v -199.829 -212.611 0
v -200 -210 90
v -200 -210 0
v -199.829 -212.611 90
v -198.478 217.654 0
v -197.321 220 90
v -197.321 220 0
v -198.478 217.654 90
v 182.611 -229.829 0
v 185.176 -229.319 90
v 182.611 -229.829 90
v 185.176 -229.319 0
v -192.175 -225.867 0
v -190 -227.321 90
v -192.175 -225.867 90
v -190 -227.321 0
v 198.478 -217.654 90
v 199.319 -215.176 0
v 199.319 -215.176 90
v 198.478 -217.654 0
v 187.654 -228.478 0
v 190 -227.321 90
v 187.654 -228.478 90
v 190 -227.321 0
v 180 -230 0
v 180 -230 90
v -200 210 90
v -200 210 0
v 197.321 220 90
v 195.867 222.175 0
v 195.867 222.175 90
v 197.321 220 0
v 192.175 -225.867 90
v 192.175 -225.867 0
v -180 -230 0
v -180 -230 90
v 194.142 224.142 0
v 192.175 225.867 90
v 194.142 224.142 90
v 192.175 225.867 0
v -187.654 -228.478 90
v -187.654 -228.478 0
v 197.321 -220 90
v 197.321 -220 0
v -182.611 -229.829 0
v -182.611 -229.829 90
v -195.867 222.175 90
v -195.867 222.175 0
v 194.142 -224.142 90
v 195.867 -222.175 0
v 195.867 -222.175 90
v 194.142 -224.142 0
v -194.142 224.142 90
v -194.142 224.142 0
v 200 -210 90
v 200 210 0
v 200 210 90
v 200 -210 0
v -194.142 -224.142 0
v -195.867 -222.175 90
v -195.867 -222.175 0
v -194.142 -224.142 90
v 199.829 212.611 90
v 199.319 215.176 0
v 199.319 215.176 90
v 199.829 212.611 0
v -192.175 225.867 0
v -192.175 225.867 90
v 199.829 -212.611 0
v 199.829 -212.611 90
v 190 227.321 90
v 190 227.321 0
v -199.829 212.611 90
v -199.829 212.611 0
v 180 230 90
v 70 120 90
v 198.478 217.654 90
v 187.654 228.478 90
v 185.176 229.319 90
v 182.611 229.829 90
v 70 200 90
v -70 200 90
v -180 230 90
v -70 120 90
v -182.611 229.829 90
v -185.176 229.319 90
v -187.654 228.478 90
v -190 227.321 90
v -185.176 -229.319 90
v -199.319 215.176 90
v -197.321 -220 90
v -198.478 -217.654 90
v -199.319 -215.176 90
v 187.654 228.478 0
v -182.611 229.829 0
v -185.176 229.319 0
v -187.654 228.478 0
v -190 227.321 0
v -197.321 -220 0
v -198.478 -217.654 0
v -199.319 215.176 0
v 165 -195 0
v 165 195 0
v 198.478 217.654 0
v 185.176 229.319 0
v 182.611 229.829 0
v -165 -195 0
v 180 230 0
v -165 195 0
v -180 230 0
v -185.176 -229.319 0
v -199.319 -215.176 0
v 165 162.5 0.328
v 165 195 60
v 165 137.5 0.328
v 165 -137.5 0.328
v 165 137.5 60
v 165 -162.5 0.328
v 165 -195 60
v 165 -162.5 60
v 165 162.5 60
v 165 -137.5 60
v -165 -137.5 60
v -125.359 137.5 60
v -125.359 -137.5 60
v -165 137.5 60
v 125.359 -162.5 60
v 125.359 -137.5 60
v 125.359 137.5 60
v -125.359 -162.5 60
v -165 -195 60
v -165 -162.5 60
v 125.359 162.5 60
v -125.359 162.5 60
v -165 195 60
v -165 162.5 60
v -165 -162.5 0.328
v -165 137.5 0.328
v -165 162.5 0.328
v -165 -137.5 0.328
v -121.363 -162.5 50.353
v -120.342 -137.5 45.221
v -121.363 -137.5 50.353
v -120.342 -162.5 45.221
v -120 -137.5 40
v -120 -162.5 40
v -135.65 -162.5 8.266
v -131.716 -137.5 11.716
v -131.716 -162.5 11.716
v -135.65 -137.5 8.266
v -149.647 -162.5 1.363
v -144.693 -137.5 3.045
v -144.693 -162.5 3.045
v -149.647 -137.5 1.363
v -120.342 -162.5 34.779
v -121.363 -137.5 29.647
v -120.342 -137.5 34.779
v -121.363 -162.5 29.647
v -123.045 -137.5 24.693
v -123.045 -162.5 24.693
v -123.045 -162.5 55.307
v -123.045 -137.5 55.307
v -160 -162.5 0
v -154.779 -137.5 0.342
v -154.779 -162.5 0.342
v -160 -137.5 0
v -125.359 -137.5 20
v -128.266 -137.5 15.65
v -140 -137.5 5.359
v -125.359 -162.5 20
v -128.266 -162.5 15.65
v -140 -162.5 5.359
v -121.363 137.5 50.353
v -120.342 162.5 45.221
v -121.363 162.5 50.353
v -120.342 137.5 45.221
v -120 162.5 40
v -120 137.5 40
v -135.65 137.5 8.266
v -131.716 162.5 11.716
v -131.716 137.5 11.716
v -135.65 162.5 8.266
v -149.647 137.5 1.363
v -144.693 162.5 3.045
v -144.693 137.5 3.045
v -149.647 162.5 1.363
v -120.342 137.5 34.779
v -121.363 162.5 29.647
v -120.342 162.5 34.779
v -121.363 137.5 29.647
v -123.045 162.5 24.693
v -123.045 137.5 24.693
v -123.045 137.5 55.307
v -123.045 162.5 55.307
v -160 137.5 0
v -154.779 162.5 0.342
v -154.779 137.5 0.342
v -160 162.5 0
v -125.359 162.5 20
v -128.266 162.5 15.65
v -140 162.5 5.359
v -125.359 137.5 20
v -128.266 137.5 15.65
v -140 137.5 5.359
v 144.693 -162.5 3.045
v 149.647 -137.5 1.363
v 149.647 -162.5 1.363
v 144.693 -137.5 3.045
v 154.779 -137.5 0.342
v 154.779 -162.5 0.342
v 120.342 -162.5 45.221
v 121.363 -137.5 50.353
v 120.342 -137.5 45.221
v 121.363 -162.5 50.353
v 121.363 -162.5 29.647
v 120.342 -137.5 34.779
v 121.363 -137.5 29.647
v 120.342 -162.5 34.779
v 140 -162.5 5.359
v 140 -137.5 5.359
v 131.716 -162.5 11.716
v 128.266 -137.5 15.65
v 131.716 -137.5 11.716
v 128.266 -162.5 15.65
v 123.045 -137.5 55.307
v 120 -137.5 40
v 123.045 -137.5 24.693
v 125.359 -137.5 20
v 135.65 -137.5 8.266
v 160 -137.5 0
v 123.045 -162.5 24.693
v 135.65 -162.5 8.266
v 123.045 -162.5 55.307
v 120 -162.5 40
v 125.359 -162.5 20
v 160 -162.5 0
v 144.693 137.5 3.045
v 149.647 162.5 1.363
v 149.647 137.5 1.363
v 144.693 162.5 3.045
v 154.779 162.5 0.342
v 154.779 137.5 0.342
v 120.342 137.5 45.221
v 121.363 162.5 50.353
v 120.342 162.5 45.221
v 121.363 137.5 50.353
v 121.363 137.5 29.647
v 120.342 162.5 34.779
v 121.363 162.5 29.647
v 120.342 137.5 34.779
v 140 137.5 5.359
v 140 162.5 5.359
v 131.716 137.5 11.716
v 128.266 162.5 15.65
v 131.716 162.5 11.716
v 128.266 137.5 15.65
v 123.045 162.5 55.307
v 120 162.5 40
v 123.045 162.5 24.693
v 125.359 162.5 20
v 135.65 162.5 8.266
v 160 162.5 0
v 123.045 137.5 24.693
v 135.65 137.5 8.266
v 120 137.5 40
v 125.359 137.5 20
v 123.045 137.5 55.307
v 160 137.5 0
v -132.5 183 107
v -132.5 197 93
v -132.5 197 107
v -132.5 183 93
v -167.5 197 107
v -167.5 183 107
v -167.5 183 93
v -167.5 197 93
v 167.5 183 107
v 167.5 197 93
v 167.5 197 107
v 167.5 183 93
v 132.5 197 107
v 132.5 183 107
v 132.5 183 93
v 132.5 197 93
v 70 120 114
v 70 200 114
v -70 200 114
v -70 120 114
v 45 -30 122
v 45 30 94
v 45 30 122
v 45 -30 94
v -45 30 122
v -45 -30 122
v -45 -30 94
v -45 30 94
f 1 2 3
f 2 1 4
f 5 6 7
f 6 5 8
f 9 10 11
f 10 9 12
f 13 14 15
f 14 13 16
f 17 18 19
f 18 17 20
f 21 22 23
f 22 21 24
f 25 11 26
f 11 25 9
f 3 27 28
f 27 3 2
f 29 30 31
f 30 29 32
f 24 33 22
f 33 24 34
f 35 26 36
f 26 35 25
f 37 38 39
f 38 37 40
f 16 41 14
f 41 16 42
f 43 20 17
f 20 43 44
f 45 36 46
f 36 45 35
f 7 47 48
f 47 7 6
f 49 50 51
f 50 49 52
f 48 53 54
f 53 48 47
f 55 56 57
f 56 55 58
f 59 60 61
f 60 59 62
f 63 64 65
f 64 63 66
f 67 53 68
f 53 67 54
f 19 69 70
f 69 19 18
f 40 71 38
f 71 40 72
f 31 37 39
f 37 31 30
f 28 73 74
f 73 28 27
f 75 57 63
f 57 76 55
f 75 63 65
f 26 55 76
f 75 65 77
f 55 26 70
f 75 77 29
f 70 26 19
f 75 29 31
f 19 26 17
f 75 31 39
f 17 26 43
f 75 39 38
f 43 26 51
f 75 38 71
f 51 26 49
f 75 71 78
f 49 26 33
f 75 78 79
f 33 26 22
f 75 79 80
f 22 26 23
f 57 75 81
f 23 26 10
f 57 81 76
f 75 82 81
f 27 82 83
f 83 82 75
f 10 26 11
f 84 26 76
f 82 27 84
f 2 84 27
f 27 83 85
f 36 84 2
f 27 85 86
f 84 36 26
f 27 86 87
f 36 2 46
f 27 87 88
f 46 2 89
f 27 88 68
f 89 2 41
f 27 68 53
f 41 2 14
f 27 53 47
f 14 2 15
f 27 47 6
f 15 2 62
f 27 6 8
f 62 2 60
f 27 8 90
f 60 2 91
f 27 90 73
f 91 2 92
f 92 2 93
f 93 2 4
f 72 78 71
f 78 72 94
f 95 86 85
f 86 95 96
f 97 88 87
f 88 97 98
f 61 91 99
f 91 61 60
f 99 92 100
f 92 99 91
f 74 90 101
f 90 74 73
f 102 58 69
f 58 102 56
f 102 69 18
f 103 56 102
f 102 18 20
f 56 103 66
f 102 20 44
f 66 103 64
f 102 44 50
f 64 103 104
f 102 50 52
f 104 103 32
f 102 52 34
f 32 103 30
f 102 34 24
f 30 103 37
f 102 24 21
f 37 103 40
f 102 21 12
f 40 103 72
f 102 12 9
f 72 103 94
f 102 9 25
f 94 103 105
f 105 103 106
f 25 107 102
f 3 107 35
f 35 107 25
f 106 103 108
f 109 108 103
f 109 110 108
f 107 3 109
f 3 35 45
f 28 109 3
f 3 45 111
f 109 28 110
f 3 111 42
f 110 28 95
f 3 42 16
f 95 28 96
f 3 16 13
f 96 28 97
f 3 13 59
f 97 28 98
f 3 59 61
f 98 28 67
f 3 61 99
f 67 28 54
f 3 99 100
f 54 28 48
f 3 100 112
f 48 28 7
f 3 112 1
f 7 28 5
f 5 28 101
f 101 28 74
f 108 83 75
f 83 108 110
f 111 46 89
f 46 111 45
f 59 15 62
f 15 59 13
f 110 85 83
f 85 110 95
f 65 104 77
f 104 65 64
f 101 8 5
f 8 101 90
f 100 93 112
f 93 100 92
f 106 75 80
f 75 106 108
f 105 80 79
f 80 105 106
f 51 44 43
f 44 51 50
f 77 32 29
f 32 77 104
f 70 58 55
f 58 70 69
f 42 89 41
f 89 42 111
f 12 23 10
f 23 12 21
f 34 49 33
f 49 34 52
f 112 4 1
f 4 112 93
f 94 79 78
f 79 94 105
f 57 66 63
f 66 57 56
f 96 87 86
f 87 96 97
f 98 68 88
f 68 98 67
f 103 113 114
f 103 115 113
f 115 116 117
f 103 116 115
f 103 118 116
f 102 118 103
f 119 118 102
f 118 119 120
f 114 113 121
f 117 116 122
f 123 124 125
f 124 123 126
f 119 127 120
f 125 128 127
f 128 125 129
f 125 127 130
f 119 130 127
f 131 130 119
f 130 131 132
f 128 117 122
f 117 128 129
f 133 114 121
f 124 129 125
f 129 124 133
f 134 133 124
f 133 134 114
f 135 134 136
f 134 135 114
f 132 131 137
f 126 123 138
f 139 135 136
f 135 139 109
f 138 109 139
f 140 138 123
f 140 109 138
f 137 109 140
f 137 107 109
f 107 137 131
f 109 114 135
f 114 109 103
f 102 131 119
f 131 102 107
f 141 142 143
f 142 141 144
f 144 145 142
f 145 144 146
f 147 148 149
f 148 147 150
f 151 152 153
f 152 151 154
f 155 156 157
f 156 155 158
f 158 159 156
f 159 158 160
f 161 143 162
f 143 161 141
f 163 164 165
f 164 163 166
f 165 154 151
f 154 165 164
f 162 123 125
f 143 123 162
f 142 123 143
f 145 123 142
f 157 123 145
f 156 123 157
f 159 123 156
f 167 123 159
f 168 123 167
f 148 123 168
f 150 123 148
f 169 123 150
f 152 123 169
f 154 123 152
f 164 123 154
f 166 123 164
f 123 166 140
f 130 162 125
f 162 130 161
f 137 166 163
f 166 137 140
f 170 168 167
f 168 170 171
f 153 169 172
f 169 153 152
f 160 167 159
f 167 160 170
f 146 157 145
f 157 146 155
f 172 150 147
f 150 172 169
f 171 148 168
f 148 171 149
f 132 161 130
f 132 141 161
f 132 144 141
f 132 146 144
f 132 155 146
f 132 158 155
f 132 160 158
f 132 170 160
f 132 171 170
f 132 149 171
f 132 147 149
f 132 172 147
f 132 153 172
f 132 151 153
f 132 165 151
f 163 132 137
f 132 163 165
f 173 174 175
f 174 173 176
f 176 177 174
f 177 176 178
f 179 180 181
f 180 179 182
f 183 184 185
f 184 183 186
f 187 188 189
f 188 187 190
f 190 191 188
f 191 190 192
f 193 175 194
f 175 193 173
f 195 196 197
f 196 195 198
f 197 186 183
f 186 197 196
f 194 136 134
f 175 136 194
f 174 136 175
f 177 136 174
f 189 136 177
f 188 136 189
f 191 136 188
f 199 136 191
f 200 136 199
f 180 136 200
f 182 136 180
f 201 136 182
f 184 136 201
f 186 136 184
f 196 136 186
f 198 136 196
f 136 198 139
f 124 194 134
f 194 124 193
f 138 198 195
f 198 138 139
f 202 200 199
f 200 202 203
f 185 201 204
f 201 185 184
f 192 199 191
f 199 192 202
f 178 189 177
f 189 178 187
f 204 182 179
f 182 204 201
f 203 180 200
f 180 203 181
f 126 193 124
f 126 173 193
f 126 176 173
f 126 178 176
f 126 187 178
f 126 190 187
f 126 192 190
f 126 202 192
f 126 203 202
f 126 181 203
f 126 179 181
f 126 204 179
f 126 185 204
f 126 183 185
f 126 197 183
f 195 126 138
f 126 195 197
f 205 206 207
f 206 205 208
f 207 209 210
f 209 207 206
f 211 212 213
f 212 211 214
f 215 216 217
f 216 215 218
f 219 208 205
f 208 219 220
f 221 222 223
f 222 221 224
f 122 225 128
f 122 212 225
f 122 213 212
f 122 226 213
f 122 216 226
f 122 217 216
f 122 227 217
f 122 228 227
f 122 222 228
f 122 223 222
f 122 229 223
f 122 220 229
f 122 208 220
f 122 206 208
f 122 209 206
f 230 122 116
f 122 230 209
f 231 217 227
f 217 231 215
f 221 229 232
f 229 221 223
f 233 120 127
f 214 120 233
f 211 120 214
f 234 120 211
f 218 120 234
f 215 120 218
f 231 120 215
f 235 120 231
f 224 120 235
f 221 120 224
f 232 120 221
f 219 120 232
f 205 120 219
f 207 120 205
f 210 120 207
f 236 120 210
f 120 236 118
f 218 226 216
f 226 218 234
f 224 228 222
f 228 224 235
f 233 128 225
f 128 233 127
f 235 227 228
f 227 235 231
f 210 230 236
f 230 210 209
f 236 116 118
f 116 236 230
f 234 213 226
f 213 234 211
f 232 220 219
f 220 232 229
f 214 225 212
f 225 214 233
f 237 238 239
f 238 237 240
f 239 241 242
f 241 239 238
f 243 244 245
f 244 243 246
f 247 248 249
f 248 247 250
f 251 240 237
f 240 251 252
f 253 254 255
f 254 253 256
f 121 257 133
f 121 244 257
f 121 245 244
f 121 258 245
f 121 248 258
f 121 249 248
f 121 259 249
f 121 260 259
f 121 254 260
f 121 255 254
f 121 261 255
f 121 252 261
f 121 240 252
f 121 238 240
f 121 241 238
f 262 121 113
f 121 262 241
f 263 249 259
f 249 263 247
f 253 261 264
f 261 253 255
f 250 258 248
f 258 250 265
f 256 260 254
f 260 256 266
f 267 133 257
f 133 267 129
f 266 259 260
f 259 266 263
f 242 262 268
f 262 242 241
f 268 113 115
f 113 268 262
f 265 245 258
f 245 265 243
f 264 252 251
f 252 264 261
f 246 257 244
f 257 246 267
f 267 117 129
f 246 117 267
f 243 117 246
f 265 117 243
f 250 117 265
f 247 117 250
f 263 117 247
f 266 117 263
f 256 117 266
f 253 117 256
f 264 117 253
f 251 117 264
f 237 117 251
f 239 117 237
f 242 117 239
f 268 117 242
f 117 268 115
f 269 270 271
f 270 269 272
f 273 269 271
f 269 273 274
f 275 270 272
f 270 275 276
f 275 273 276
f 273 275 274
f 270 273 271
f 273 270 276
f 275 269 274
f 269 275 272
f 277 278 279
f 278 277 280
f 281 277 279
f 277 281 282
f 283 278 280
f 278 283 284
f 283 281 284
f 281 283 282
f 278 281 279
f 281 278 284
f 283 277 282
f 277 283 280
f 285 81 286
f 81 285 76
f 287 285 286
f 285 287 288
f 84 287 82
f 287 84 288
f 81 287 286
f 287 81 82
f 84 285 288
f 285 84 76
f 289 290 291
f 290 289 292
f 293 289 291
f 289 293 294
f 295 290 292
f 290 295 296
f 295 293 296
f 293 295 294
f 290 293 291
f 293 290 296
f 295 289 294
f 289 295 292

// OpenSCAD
// SmartAI robot chassis — Variant C: Wide Stable
// Wide wheelbase for straight-line trim tuning and heavy battery.

$fn = 48;

body_w = 360;
body_l = 420;
body_h = 90;
wheel_d = 80;
wheel_w = 25;
wheelbase = 320;
track = 300;

module wheel() {
    rotate([90, 0, 0])
        cylinder(h = wheel_w, d = wheel_d, center = true);
}

// Low wide platform
difference() {
    hull() {
        translate([-body_w/2, -body_l/2, 0])
            cylinder(h = body_h, d = 40);
        translate([body_w/2, -body_l/2, 0])
            cylinder(h = body_h, d = 40);
        translate([body_w/2, body_l/2, 0])
            cylinder(h = body_h, d = 40);
        translate([-body_w/2, body_l/2, 0])
            cylinder(h = body_h, d = 40);
    }
    translate([0, 0, 15])
        cube([body_w - 30, body_l - 30, body_h], center = true);
}

for (x = [-wheelbase/2, wheelbase/2]) {
    for (y = [-track/2, track/2]) {
        translate([x, y, wheel_d/2])
            wheel();
    }
}

// Battery tray (rear)
translate([0, body_l/2 - 50, body_h + 12])
    cube([140, 80, 24], center = true);

// Dual ultrasonic (front corners)
for (sx = [-1, 1]) {
    translate([sx * (body_w/2 - 30), body_l/2 - 20, body_h + 10])
        cube([35, 14, 14], center = true);
}

// Pi stack (center)
translate([0, 0, body_h + 18])
    cube([90, 60, 28], center = true);
